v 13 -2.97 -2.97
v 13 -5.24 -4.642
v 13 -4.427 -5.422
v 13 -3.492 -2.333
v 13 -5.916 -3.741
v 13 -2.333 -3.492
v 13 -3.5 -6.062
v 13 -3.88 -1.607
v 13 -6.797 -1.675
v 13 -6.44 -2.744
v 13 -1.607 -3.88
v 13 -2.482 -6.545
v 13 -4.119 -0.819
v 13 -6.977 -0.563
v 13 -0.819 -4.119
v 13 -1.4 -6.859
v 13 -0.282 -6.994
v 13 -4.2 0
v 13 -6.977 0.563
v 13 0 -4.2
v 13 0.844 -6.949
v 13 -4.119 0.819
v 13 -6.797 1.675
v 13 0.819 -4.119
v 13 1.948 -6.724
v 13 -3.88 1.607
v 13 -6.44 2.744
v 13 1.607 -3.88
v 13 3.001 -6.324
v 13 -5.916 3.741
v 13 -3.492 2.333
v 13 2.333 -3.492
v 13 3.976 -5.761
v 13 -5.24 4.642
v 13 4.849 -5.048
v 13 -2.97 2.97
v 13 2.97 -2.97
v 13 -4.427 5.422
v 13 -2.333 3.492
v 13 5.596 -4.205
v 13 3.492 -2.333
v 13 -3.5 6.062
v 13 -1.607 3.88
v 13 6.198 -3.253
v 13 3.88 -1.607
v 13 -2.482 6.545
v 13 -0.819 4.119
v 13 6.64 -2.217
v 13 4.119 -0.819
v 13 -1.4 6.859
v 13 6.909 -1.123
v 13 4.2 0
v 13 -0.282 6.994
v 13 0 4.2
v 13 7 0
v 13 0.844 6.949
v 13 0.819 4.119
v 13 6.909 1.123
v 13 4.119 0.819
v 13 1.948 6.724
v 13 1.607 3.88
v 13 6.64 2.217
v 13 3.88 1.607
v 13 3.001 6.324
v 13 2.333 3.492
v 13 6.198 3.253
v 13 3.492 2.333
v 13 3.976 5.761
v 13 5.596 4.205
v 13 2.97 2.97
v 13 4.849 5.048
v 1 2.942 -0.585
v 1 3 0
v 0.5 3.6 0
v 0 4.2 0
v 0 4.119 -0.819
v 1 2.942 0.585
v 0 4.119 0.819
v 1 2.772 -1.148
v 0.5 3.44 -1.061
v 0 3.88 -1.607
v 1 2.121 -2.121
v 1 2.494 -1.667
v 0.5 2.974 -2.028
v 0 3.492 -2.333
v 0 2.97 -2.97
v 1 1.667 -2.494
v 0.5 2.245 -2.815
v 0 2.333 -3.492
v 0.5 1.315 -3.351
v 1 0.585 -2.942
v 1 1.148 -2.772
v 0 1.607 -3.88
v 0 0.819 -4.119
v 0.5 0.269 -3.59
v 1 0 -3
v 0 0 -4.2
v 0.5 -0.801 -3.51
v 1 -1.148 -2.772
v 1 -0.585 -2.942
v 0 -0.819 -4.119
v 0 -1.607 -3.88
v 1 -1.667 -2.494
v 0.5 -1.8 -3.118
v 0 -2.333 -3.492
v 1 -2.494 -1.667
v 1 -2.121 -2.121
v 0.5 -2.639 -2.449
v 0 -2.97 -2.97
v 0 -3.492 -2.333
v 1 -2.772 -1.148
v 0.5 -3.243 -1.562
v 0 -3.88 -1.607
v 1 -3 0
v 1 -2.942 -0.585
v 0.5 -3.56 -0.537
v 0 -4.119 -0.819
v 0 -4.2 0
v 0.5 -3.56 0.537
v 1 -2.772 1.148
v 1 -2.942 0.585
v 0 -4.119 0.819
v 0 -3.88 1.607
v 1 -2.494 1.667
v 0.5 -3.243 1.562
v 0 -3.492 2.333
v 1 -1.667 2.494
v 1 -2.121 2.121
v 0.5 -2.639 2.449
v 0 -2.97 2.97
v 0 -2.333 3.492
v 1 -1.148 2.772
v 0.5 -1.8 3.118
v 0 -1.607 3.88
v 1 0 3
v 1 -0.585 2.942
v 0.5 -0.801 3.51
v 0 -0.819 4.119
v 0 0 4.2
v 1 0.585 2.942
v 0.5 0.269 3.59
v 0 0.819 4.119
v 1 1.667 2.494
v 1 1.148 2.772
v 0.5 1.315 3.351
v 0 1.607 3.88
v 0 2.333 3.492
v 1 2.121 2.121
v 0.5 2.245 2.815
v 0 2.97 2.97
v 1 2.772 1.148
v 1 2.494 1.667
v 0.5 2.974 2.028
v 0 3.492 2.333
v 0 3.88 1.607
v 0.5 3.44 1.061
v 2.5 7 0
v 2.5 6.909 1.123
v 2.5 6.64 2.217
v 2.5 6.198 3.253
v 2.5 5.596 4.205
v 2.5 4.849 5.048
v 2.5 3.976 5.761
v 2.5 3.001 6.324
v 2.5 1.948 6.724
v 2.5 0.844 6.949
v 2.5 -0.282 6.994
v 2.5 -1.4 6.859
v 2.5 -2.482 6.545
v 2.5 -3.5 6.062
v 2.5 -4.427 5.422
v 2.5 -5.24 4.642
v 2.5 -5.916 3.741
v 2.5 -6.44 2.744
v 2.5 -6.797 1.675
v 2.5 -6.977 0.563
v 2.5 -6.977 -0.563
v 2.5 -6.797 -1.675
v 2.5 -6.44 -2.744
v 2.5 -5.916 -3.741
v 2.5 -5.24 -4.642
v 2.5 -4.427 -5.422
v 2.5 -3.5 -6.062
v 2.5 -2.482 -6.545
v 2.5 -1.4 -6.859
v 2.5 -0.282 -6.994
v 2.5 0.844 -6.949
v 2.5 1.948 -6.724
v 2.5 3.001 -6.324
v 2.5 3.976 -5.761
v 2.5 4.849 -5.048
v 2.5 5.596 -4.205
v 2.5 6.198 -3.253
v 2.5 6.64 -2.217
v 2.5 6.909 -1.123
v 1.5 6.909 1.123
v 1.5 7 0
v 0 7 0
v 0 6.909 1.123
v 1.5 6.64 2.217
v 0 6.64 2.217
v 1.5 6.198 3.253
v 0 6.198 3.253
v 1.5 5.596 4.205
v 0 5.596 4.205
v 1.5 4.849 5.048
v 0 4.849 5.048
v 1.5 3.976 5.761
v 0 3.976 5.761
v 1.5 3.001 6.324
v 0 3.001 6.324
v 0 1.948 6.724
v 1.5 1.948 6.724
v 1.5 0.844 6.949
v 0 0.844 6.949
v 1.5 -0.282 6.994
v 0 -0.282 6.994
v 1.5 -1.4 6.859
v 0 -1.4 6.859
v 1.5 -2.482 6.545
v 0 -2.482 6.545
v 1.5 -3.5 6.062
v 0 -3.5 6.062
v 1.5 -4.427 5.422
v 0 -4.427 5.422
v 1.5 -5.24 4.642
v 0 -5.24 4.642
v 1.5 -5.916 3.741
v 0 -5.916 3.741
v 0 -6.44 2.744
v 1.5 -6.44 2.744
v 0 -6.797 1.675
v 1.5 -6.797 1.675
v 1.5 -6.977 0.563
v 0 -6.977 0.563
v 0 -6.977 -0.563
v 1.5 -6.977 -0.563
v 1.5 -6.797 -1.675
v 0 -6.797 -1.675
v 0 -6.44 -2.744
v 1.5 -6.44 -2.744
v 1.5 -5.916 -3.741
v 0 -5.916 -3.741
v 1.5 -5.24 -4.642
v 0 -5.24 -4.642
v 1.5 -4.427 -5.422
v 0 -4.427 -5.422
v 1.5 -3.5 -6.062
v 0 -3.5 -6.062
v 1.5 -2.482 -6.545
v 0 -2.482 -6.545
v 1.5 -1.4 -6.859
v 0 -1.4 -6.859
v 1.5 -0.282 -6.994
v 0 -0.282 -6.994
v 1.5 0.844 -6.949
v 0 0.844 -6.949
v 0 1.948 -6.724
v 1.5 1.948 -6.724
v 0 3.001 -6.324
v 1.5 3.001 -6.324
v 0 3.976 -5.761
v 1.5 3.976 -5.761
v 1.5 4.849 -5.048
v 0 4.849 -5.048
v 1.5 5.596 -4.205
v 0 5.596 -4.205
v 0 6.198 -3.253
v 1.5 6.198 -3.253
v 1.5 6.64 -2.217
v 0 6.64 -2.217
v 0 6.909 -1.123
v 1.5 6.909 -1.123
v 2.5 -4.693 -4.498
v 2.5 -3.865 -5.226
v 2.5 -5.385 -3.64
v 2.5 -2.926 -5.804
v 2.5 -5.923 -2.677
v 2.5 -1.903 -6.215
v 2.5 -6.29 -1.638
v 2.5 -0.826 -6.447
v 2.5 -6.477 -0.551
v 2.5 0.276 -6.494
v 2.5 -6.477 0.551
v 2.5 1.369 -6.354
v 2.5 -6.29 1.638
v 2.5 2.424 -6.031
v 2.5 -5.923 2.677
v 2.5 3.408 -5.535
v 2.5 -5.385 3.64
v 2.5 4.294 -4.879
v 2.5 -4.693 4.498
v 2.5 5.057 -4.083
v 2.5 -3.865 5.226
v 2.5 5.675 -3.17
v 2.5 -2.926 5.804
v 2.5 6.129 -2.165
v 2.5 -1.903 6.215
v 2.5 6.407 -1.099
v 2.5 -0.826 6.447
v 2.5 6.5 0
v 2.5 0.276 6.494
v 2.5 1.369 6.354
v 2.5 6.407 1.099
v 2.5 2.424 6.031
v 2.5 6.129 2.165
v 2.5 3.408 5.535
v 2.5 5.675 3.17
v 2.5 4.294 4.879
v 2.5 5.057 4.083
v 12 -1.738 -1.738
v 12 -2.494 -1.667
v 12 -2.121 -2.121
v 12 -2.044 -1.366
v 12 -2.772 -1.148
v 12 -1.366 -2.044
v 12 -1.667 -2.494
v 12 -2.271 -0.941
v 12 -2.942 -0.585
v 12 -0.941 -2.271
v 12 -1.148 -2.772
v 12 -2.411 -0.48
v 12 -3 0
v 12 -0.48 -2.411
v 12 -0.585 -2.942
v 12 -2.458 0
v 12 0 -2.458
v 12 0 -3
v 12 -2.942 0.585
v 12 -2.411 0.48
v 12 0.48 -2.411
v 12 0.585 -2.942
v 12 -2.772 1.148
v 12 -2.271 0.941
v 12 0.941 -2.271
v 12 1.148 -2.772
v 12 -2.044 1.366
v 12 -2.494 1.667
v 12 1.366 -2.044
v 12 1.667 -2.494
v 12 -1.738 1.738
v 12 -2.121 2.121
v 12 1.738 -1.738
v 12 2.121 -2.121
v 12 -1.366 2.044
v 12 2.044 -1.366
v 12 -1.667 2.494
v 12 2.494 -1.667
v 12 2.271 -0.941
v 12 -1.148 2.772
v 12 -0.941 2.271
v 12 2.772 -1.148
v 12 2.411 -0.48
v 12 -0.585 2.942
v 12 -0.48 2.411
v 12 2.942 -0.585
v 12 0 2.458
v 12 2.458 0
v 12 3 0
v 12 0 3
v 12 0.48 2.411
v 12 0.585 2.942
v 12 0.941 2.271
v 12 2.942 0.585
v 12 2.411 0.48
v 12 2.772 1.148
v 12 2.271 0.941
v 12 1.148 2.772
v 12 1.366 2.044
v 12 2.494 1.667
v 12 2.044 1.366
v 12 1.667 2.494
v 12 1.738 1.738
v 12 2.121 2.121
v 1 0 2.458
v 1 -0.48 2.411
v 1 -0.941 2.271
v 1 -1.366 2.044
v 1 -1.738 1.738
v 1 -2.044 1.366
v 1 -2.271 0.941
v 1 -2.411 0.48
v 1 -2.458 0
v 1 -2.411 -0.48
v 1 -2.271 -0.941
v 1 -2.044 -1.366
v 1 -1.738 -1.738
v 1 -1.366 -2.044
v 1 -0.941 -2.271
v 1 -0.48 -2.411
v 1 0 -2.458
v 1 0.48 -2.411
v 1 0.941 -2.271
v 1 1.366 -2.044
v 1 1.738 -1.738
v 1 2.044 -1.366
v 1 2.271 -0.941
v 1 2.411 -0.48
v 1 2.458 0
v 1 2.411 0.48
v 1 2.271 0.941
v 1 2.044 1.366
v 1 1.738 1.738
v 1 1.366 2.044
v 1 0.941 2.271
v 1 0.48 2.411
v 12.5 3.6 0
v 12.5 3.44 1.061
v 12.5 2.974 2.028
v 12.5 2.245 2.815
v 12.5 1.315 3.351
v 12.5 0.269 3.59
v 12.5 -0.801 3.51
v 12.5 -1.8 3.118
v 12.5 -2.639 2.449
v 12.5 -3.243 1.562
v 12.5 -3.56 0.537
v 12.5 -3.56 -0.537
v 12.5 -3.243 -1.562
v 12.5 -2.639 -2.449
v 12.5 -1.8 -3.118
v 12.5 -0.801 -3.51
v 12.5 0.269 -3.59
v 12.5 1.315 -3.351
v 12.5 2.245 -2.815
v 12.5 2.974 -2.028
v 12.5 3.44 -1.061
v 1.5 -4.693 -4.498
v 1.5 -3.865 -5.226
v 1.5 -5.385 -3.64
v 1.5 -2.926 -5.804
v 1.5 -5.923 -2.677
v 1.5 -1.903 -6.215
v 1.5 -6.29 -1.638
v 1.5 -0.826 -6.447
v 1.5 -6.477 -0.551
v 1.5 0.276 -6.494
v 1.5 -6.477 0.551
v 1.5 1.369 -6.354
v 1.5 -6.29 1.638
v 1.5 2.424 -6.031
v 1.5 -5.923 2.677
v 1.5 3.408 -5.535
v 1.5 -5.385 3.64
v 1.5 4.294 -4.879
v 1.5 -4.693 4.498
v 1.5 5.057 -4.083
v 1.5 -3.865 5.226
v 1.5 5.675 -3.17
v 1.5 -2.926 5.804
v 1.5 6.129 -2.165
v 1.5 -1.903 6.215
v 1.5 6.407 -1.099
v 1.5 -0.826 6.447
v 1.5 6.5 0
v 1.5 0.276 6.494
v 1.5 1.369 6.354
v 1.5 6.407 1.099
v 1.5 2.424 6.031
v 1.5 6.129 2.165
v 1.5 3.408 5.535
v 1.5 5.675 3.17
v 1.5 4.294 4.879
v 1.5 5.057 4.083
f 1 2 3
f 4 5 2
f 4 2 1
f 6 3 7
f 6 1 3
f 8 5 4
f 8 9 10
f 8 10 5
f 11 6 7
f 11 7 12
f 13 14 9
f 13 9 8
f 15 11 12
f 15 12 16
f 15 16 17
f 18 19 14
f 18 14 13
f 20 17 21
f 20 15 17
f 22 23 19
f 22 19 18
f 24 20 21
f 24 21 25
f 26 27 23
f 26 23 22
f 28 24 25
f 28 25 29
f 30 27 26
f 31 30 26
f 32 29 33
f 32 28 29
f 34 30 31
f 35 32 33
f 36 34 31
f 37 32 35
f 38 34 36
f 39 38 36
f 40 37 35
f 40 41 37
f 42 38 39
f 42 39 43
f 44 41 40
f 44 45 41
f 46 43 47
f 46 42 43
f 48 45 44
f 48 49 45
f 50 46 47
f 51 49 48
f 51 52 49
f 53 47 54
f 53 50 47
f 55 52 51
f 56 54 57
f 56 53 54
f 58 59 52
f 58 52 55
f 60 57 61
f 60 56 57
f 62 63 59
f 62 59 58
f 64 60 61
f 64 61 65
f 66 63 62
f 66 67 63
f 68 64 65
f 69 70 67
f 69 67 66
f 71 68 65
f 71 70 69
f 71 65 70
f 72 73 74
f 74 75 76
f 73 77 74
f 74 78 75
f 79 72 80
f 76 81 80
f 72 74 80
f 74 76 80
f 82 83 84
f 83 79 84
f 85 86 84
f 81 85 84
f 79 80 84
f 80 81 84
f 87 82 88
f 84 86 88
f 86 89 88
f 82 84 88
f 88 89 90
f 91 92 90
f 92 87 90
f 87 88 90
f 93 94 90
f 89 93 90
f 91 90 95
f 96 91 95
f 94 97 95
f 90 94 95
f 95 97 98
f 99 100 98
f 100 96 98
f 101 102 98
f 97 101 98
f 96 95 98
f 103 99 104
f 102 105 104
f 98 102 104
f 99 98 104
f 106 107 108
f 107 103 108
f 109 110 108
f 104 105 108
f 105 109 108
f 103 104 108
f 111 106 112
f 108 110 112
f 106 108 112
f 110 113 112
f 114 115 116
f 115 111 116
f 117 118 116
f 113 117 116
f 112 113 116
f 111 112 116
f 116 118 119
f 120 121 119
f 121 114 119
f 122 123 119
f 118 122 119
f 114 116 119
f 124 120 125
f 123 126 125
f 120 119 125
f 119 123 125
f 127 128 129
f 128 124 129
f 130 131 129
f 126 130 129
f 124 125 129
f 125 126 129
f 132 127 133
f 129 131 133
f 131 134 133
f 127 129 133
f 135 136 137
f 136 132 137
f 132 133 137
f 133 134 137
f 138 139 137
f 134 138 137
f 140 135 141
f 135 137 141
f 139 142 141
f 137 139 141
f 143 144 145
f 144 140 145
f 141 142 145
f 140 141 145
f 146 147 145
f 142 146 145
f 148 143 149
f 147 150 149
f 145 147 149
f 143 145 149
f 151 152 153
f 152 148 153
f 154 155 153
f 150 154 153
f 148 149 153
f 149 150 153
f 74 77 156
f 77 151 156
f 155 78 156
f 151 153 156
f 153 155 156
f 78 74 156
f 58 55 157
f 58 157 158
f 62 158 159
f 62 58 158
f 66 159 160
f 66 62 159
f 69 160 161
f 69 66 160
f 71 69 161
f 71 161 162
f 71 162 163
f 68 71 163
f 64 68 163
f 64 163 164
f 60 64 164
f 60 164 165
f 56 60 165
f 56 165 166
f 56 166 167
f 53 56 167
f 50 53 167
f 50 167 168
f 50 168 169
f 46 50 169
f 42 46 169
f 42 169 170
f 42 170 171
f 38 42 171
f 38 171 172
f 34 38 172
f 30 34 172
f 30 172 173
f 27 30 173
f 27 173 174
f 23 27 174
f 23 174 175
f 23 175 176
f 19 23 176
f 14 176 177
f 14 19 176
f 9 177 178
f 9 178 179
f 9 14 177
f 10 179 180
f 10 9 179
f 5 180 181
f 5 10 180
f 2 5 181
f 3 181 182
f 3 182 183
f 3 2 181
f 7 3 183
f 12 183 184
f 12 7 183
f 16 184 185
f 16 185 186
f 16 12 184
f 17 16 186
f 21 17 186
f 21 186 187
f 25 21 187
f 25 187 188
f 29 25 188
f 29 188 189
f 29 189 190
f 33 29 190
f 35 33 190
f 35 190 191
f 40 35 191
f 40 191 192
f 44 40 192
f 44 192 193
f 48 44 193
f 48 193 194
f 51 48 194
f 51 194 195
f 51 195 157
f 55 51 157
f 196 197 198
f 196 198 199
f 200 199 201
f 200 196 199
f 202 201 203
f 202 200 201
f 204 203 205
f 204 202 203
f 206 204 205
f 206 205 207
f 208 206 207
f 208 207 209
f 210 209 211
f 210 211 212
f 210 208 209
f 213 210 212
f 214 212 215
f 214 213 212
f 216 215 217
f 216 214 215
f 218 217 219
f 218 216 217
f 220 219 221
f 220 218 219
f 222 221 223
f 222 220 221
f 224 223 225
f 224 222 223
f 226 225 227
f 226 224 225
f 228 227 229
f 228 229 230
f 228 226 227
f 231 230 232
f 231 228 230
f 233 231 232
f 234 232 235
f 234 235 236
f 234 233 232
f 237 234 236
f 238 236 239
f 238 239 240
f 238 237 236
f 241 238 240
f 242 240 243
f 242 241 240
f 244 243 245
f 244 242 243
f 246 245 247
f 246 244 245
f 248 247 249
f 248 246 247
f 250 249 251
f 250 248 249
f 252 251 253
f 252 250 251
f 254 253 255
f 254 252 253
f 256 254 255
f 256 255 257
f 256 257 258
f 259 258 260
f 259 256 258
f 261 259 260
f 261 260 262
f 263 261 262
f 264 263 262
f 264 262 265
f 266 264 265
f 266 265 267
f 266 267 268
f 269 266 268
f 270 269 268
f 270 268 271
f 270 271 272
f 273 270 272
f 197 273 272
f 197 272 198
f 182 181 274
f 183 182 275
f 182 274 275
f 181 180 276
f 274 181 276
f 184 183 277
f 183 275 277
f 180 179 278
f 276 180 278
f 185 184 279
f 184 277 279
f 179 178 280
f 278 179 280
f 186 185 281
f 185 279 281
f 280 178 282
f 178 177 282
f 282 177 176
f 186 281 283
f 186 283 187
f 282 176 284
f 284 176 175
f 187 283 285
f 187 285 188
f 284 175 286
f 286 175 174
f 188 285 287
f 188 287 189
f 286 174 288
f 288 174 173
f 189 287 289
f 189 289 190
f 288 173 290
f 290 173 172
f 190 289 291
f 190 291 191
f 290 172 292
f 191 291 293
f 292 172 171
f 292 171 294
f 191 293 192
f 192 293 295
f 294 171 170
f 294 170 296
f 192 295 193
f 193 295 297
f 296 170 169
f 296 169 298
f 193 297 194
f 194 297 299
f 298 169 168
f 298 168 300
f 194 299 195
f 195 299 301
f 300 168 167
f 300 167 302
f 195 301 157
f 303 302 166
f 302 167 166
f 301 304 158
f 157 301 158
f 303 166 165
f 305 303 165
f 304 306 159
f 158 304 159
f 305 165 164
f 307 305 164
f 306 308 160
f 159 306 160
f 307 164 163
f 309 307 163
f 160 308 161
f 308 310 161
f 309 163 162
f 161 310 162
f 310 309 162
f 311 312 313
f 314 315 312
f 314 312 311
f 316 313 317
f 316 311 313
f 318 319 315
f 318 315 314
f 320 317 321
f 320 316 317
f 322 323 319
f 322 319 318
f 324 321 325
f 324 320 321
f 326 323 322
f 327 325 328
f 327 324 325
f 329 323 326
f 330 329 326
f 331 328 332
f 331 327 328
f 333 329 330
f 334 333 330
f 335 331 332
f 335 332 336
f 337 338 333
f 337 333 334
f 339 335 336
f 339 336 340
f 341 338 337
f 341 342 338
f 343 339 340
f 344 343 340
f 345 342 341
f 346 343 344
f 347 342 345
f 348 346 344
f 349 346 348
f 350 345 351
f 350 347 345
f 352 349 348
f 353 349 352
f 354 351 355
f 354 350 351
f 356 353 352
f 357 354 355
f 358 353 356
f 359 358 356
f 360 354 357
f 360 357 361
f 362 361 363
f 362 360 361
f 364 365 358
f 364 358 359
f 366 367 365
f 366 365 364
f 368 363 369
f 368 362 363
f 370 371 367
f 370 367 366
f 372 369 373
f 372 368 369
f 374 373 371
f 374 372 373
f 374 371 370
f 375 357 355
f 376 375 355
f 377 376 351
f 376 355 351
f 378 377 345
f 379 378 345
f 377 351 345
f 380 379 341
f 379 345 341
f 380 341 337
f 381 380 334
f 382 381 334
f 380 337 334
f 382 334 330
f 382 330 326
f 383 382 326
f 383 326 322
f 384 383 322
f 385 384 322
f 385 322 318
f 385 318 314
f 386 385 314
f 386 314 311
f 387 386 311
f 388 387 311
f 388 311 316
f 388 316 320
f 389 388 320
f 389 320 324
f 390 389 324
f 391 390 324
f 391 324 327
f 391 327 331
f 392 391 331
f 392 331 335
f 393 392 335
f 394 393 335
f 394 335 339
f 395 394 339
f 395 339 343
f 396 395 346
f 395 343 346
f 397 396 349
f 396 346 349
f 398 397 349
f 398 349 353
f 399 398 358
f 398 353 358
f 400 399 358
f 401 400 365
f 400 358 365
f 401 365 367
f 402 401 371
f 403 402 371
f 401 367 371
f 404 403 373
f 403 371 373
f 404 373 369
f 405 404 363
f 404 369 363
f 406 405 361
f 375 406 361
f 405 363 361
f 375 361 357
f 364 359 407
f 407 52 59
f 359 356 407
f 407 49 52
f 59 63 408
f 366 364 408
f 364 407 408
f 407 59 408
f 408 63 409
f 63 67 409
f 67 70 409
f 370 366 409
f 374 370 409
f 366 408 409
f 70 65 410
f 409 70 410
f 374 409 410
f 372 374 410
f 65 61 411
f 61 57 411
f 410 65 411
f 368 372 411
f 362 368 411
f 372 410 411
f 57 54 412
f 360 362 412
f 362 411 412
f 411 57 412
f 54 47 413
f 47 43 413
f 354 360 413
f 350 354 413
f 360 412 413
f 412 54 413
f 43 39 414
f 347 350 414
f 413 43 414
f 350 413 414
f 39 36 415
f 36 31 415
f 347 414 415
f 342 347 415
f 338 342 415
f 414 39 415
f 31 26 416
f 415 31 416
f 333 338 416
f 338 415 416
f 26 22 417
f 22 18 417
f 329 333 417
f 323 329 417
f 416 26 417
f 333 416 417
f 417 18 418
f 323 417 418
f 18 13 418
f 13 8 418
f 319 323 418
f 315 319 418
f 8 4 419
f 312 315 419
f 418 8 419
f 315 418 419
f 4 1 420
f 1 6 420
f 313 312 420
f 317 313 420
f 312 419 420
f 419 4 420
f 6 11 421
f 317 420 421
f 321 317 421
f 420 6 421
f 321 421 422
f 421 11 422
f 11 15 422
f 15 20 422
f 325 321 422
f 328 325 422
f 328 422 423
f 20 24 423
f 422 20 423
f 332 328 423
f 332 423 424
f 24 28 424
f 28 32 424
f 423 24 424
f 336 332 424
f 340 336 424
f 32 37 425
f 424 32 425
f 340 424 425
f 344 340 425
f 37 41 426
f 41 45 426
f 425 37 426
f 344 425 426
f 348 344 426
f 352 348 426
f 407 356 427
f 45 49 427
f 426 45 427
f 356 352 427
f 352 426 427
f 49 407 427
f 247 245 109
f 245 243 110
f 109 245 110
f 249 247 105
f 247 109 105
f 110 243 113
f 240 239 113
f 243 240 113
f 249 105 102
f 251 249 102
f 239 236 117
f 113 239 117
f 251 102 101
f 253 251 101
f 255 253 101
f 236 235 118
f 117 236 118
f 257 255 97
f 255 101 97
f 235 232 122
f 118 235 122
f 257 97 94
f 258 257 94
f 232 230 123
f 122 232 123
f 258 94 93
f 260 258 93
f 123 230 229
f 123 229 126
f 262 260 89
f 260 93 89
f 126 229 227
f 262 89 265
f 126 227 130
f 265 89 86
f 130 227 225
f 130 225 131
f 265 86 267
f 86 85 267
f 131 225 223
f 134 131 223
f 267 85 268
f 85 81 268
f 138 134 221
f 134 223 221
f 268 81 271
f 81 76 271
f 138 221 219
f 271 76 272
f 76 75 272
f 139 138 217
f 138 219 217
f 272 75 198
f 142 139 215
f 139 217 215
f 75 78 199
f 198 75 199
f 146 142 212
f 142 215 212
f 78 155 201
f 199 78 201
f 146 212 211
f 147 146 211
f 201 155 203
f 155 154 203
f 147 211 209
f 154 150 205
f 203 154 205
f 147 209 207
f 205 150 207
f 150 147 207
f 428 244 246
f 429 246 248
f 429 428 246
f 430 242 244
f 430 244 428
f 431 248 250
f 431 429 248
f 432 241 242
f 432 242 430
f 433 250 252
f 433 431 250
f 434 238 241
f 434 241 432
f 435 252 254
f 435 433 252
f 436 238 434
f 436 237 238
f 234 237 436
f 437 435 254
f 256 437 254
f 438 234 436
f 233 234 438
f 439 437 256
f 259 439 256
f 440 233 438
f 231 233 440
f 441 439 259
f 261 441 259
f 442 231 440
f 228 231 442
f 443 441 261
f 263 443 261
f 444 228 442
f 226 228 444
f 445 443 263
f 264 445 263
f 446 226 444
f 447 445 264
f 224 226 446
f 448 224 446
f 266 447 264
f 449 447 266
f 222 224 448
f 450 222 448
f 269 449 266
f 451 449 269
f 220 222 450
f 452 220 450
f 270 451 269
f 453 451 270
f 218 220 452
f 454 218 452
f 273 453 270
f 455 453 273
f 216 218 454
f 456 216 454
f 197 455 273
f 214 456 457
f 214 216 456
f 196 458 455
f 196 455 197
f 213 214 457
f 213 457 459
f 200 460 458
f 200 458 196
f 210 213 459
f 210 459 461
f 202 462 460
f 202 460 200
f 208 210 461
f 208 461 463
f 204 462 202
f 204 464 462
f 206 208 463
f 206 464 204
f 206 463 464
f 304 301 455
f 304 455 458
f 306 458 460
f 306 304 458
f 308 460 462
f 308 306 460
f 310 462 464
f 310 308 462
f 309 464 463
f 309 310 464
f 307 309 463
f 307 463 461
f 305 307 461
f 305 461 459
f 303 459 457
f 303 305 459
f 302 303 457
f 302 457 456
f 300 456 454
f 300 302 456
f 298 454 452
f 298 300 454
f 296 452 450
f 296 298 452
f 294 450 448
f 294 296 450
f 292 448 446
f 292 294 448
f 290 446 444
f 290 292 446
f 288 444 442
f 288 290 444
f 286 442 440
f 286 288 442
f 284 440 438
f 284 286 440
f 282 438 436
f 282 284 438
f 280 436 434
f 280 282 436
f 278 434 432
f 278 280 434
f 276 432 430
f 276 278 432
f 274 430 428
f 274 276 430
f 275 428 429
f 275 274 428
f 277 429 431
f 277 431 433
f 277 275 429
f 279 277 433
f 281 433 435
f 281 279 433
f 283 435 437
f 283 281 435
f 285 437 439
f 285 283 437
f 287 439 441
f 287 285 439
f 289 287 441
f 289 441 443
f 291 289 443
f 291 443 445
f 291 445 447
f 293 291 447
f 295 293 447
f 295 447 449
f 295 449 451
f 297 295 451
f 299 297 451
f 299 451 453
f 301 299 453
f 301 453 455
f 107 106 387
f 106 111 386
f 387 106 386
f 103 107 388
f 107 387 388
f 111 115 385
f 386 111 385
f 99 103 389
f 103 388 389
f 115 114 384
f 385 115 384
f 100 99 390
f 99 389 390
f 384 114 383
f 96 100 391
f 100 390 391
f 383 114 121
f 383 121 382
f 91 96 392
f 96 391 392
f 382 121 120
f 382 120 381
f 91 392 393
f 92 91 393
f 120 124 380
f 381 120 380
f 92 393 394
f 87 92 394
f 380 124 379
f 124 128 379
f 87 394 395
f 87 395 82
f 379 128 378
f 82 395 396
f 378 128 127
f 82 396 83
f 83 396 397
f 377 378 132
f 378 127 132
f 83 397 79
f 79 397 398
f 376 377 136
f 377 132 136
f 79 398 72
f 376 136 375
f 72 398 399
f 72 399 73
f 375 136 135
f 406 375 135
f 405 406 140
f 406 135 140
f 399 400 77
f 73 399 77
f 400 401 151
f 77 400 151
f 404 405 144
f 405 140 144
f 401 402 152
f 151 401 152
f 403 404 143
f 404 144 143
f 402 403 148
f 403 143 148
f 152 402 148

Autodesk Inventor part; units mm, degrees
ref_plane "YZ Plane" through (0, 0, 0) normal (1, 0, 0) x (0, 1, 0)
ref_plane "XZ Plane" through (0, 0, 0) normal (0, 1, 0) x (-1, 0, 0)
ref_plane "XY Plane" through (0, 0, 0) normal (0, 0, 1) x (1, 0, 0)
sketch "Sketch2" plane through (0, 0, 0) normal (0, 0, 1) x (1, 0, 0)
  line L0 (0, 0) -> (18.2937, 0)
  line L1 (0, 4.2) -> (0, 7)
  line L2 (0, 7) -> (1.5, 7)
  line L3 (1.5, 7) -> (1.5, 6.5)
  line L4 (1.5, 6.5) -> (2.5, 6.5)
  line L5 (2.5, 6.5) -> (2.5, 7)
  line L6 (2.5, 7) -> (13, 7)
  line L7 (13, 7) -> (13, 4.2)
  line L8 (0, 4.2) -> (1, 3)
  line L9 (1, 3) -> (1, 0)
  line L10 (13, 4.2) -> (12, 3)
  line L11 (12, 3) -> (12, 0)
  dimension "d12" = 13
  dimension "d13" = 7
  dimension "d14" = 1.5
  dimension "d15" = 1
  dimension "d16" = 0.5
  dimension "d17" = 3
  dimension "d18" = 1
  dimension "d19" = 1.2
  dimension "d20" = 1
revolve "Revolution1" add sketch "Sketch2" angle 360 about axis through (0, 0, 0) along (1, 0, 0)
hole "Hole2" at (1, 0, 0) direction (1, 0, 0) diameter 4.917 end through all thread size "M6x1" class "6H" standard "ANSI Metric M Profile"
properties part number "igus_DST-JSRM-1413DS6.35x2.54"
